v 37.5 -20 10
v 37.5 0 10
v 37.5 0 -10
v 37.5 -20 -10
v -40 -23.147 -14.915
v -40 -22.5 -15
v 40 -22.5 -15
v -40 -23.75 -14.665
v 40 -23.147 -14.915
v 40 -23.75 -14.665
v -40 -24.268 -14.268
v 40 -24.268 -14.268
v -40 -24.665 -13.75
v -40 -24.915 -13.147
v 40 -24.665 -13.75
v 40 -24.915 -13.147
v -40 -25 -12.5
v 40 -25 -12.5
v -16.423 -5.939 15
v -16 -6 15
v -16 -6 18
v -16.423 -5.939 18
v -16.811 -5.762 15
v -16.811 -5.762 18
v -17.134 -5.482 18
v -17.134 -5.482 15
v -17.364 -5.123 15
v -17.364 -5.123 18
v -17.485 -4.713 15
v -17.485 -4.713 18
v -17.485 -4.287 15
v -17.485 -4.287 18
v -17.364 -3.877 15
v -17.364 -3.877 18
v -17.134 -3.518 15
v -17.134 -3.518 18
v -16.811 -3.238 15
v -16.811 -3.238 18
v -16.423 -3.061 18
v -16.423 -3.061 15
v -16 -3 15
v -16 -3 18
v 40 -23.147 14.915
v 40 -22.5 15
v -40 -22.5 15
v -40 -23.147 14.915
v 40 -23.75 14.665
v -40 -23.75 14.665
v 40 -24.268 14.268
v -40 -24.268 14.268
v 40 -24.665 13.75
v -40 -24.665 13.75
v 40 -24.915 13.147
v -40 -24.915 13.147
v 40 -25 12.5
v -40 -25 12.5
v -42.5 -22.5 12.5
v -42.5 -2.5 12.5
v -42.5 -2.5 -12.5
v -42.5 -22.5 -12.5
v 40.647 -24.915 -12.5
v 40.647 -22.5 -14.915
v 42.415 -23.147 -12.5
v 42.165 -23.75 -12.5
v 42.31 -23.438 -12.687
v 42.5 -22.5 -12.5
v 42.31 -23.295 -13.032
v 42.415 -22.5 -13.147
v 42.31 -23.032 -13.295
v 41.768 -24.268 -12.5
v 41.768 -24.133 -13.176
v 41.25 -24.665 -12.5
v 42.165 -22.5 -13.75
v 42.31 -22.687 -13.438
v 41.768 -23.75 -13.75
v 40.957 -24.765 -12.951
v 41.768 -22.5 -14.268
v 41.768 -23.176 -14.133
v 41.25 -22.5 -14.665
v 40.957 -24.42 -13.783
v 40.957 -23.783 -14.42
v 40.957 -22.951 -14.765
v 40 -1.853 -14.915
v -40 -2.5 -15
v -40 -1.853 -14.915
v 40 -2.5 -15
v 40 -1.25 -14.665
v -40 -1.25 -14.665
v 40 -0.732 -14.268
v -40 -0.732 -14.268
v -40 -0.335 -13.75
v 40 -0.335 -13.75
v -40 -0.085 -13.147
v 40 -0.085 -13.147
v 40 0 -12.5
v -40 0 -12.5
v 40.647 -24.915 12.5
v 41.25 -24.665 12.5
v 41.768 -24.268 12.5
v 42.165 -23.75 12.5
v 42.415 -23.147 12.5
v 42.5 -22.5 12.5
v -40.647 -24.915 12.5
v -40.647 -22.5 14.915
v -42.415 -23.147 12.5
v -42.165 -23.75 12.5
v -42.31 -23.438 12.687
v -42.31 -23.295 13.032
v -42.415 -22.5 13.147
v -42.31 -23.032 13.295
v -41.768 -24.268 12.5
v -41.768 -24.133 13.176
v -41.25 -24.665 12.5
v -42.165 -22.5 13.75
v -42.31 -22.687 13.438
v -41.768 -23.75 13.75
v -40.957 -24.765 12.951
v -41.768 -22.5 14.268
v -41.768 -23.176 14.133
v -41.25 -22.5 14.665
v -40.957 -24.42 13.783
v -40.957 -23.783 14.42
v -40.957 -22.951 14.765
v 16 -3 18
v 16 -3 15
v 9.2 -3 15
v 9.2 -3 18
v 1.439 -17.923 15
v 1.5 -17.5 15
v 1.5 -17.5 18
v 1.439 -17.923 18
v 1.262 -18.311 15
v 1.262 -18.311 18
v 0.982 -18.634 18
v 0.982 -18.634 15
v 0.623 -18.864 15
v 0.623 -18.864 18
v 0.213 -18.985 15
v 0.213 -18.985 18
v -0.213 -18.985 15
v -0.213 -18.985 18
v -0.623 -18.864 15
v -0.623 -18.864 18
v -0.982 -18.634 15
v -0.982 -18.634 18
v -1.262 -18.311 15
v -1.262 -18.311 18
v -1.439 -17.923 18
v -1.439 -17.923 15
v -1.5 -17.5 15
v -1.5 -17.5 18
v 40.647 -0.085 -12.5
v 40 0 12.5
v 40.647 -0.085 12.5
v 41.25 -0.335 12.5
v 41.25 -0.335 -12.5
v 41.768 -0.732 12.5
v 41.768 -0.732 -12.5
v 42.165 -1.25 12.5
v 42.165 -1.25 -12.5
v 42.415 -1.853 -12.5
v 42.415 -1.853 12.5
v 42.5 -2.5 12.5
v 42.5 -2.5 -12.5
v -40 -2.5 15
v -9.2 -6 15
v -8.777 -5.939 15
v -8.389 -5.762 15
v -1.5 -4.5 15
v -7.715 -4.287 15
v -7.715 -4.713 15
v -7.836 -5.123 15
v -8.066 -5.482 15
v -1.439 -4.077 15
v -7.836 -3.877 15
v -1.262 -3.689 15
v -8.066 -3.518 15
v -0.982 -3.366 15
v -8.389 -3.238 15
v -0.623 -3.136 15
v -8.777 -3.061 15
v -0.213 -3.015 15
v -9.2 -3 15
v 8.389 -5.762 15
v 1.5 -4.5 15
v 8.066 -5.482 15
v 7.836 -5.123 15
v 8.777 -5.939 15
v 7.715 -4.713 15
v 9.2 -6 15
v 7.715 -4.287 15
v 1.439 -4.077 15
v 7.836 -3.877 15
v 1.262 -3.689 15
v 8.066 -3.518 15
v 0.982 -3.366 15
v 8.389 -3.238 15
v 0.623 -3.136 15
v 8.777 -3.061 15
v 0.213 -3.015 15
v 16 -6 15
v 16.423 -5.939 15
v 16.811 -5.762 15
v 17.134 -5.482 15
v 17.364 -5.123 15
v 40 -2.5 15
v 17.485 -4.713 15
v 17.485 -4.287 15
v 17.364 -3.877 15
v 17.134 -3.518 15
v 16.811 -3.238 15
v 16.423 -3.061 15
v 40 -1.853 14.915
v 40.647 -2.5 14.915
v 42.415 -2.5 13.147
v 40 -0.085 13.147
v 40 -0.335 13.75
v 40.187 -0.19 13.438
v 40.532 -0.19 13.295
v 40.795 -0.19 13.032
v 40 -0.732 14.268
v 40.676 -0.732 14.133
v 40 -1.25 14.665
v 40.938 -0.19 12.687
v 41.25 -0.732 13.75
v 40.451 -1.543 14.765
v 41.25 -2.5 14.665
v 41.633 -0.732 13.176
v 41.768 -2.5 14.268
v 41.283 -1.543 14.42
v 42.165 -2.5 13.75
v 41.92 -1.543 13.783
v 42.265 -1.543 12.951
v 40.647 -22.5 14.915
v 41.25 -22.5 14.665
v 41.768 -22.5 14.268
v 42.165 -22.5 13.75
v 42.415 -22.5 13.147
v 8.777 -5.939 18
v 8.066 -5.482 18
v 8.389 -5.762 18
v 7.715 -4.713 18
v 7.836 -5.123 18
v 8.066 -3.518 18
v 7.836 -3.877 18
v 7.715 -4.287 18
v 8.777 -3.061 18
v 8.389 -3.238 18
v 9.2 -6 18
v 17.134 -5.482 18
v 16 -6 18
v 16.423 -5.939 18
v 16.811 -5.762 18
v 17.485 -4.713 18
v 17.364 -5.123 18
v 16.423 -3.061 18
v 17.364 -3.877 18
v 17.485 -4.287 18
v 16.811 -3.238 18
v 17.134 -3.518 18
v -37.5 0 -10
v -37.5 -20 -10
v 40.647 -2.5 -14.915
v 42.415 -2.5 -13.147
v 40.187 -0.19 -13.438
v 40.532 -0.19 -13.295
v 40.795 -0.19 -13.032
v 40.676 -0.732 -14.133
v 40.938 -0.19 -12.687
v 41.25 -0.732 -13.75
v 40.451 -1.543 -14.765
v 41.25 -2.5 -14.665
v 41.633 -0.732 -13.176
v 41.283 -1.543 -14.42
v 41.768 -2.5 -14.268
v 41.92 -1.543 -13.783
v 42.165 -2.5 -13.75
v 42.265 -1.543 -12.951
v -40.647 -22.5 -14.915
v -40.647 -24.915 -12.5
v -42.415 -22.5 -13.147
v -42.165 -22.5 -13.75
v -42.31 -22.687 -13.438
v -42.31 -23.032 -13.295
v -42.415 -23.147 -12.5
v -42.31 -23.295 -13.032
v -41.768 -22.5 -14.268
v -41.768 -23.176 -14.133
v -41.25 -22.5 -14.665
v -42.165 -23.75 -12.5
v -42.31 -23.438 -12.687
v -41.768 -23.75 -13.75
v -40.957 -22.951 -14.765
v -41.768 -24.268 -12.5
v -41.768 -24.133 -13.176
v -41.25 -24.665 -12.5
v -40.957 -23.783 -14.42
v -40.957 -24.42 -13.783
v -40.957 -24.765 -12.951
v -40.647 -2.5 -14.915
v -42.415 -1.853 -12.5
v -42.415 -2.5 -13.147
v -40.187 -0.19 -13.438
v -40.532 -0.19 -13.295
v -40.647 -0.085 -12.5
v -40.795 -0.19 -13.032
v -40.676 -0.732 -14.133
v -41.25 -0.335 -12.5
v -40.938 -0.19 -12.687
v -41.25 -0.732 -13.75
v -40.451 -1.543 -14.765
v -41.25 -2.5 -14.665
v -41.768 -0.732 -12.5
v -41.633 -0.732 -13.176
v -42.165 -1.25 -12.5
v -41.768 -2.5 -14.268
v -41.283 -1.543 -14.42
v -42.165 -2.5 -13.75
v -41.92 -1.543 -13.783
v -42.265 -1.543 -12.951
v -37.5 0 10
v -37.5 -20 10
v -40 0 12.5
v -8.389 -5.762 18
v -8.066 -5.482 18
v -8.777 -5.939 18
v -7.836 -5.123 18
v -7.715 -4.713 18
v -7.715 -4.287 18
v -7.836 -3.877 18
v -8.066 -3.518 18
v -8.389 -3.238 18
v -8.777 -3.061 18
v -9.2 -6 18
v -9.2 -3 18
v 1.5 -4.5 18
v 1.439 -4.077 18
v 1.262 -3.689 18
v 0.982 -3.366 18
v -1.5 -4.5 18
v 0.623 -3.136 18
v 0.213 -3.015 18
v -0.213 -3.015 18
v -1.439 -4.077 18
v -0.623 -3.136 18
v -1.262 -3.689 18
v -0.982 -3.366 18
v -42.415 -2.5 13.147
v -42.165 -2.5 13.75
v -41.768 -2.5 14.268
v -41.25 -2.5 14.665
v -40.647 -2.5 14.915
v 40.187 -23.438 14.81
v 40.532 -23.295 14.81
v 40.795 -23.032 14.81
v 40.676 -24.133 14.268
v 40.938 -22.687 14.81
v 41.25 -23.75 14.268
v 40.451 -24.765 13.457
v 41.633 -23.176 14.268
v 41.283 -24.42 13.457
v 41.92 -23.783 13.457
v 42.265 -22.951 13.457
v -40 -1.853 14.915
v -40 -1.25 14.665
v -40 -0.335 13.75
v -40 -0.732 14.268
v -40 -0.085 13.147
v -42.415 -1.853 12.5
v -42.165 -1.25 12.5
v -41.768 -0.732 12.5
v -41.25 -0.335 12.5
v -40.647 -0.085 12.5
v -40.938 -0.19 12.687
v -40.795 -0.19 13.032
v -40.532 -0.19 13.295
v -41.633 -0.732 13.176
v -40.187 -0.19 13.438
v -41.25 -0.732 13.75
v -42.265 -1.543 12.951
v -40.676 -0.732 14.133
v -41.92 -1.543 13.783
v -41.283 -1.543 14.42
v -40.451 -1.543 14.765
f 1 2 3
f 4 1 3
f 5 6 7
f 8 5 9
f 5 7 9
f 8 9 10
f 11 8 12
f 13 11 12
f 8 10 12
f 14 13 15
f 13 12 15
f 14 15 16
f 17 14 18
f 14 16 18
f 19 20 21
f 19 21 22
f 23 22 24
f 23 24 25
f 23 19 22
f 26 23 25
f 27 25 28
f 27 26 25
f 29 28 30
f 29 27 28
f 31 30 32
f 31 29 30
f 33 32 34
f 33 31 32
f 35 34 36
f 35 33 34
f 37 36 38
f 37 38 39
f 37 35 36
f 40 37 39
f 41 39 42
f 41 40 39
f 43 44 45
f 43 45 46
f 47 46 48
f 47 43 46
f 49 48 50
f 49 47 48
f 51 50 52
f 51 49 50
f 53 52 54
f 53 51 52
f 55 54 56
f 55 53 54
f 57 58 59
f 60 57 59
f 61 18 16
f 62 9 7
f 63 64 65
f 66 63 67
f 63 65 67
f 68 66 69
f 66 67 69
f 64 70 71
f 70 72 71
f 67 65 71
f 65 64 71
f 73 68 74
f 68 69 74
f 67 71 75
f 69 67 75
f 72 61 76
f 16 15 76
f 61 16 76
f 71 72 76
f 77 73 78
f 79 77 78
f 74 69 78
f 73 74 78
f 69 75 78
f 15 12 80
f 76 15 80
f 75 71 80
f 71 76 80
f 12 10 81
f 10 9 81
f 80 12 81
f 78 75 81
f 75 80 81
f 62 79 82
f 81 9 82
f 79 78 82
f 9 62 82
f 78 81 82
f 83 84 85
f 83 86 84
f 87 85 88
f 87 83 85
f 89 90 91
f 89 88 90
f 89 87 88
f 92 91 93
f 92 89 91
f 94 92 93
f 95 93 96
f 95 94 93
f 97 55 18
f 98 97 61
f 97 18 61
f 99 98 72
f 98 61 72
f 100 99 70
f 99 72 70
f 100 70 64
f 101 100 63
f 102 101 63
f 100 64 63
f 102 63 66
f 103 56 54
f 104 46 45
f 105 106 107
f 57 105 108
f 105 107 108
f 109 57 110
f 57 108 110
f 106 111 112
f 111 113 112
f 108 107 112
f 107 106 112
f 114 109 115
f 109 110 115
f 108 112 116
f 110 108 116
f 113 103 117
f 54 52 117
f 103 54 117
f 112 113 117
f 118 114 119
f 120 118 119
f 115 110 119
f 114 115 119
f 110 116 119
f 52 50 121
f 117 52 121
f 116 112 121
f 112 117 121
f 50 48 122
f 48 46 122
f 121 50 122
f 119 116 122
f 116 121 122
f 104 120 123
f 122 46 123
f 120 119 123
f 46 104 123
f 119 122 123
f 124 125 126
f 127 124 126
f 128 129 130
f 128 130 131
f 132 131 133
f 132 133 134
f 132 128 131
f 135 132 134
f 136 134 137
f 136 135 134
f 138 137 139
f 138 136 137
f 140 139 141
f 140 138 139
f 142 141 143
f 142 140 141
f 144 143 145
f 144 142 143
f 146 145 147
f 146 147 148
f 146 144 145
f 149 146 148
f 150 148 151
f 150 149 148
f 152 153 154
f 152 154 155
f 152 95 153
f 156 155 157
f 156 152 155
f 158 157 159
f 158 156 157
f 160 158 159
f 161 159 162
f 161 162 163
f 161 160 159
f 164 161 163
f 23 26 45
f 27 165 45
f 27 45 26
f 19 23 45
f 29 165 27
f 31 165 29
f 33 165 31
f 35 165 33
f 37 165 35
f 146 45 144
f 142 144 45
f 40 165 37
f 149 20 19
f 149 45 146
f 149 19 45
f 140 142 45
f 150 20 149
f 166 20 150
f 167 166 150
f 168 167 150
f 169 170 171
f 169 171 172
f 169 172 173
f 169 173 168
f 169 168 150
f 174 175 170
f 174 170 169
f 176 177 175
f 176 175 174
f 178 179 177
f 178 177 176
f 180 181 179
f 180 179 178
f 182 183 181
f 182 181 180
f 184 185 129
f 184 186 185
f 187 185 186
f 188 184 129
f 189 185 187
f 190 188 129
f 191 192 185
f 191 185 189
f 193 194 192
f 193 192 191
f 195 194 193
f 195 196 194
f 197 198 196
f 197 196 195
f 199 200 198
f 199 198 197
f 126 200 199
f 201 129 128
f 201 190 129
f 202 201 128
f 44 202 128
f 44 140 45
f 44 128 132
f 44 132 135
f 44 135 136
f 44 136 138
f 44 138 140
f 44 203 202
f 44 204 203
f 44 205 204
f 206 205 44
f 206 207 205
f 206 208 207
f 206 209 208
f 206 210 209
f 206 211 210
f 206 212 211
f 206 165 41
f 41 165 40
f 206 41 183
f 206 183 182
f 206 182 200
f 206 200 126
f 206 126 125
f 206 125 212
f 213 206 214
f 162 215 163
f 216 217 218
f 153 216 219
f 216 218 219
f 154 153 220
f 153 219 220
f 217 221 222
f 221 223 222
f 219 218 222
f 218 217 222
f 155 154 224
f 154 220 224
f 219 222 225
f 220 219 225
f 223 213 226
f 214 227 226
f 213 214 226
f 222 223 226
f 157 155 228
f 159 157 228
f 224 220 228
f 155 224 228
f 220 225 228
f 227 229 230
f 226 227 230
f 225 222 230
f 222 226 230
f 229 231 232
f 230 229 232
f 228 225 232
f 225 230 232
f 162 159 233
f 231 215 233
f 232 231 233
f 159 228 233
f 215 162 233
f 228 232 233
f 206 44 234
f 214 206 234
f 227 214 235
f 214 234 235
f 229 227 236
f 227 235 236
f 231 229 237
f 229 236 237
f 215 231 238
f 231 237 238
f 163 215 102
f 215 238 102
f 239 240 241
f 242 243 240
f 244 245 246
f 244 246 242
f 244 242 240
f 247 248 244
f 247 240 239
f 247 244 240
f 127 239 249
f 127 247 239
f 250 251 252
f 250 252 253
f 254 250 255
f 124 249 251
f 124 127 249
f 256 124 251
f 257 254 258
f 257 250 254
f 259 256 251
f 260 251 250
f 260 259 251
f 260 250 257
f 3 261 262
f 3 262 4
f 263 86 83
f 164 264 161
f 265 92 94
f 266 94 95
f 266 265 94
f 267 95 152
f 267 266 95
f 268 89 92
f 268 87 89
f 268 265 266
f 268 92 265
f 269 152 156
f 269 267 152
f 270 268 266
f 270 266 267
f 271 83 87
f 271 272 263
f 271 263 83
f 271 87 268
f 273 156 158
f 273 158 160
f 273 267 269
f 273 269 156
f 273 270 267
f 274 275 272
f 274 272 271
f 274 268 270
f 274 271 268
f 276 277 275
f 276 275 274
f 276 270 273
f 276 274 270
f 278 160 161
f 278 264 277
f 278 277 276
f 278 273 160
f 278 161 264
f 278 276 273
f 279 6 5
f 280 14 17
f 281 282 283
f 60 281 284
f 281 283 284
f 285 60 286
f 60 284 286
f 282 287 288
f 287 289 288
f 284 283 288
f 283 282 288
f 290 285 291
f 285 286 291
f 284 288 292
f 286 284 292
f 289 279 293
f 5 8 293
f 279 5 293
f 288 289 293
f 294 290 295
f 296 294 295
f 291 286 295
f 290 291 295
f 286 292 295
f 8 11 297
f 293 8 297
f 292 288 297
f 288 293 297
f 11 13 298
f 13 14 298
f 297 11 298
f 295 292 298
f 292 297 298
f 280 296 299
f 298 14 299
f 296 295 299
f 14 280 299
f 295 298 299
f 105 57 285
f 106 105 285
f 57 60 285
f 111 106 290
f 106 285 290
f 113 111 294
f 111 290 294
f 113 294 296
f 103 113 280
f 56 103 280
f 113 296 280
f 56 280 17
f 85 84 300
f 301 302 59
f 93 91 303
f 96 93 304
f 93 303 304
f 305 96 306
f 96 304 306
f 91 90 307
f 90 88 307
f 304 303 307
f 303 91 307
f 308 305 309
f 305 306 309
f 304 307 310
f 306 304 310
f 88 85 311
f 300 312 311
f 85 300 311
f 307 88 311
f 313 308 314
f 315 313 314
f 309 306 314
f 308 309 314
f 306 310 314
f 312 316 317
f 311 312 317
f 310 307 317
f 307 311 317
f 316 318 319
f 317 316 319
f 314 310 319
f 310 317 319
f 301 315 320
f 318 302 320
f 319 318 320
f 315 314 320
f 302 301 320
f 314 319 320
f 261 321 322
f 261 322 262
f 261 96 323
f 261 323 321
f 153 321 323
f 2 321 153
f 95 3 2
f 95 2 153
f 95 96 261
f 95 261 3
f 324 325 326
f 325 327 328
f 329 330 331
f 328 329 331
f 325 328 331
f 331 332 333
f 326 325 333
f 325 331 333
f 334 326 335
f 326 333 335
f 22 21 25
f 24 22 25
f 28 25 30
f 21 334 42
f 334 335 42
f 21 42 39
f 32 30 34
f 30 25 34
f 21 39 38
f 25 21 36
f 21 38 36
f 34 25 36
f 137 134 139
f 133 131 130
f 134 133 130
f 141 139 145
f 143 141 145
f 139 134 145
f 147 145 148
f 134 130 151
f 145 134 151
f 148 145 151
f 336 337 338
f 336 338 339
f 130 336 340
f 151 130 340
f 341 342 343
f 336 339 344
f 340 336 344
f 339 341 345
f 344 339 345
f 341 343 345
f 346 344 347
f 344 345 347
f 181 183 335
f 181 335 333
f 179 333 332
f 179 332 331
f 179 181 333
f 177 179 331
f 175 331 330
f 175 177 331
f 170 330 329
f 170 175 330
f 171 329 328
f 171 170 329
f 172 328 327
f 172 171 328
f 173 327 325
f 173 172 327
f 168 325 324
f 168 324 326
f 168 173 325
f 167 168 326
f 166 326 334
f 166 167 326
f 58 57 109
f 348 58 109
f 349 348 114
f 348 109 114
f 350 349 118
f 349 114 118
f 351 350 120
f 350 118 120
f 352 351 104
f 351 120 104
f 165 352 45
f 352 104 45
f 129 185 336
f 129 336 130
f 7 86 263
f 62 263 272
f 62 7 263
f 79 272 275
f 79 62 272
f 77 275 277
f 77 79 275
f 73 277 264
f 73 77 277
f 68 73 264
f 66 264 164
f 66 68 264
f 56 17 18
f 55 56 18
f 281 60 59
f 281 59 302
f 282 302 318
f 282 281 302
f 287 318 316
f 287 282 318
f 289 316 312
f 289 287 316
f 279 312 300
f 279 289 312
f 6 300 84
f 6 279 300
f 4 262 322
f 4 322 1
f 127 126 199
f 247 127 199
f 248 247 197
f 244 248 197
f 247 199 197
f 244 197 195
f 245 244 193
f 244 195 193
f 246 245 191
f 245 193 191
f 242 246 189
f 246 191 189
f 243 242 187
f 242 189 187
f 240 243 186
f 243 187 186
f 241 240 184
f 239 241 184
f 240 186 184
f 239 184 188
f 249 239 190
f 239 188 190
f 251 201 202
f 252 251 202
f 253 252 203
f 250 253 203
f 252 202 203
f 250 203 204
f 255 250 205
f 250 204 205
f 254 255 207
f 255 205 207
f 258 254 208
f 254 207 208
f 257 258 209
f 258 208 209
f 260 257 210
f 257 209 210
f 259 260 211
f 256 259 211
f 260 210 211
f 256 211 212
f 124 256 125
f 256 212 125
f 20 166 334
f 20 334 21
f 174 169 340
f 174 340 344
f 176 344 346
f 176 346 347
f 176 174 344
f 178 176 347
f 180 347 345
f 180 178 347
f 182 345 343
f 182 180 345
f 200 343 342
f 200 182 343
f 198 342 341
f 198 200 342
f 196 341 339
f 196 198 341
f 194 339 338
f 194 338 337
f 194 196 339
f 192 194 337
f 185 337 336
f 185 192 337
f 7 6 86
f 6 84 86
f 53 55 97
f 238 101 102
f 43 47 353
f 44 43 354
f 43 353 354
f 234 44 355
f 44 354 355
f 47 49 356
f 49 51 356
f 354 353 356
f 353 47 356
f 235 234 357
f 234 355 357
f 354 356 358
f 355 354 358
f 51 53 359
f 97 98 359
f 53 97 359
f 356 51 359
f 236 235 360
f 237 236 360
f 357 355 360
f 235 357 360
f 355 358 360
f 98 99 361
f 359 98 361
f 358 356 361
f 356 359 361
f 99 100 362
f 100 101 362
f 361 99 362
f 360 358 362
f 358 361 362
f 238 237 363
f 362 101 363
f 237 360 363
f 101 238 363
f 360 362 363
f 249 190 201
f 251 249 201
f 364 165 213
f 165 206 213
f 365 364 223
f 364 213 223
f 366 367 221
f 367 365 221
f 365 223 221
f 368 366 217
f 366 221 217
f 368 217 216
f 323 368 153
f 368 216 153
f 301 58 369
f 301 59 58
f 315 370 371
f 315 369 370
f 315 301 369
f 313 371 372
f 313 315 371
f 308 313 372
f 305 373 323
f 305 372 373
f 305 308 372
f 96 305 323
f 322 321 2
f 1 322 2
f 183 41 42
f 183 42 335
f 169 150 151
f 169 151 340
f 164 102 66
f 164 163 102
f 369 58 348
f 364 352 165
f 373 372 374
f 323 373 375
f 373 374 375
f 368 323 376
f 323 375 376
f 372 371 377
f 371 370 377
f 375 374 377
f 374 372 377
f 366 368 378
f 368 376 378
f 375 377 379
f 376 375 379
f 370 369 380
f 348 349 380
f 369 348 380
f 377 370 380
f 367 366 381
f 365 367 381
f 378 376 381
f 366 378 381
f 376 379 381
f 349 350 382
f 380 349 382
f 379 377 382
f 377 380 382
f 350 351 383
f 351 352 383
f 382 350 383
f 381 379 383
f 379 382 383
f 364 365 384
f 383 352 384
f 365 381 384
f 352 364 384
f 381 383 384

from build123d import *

# Parameters (mm, degrees)
SKETCH_1_W          = 75
SKETCH_1_H          = 20
EXTRUDE_1_DEPTH     = 20
SKETCH_2_W          = 85
SKETCH_2_H          = 30
EXTRUDE_2_DEPTH     = 25
SKETCH_3_W          = 75
SKETCH_3_H          = 20
CUT_EXTRUDE_1_DEPTH = 20
EXTRUDE_3_DEPTH     = 3
FILLET_1_R          = 2.5


with BuildPart() as part:
    # Sketch 1 → Extrude 1 (new body)
    with BuildSketch(Plane(origin=(0, 0, 0), x_dir=(1, 0, 0), z_dir=(0, 1, 0))):
        Rectangle(SKETCH_1_W, SKETCH_1_H)
    extrude(amount=-EXTRUDE_1_DEPTH)

    # Sketch 2 → Extrude 2 (add)
    with BuildSketch(Plane(origin=(0, 0, 0), x_dir=(1, 0, 0), z_dir=(0, 1, 0))):
        Rectangle(SKETCH_2_W, SKETCH_2_H)
    extrude(amount=-EXTRUDE_2_DEPTH)

    # Sketch 3 → Cut-Extrude 1 (cut)
    with BuildSketch(Plane(origin=(0, 0, 0), x_dir=(1, 0, 0), z_dir=(0, 1, 0))):
        Rectangle(SKETCH_3_W, SKETCH_3_H)
    extrude(amount=-CUT_EXTRUDE_1_DEPTH, mode=Mode.SUBTRACT)

    # Sketch 5 → Extrude 3 (add)
    with BuildSketch(Plane.XY.offset(15)):
        with BuildLine():
            Line((-16, -3), (-9.2, -3))
            ThreePointArc((-9.2, -3), (-7.7, -4.5), (-9.2, -6))
            Line((-9.2, -6), (-16, -6))
            ThreePointArc((-16, -6), (-17.5, -4.5), (-16, -3))
        make_face()
        with BuildLine():
            Line((16, -3), (9.2, -3))
            ThreePointArc((9.2, -3), (7.7, -4.5), (9.2, -6))
            Line((9.2, -6), (16, -6))
            ThreePointArc((16, -6), (17.5, -4.5), (16, -3))
        make_face()
        with BuildLine():
            Line((1.5, -4.5), (1.5, -17.5))
            ThreePointArc((1.5, -17.5), (0, -19), (-1.5, -17.5))
            Line((-1.5, -17.5), (-1.5, -4.5))
            ThreePointArc((-1.5, -4.5), (0, -3), (1.5, -4.5))
        make_face()
    extrude(amount=EXTRUDE_3_DEPTH)

    # Fillet 1
    fillet_1_edges = [part.edges().sort_by_distance(p)[0] for p in [
        (0, -25, -15),
        (-42.5, -12.5, -15),
        (42.5, -25, 0),
        (42.5, -12.5, -15),
        (0, -25, 15),
        (42.5, -12.5, 15),
        (-42.5, -25, 0),
        (-42.5, -12.5, 15),
        (0, 0, -15),
        (-42.5, 0, 0),
        (0, 0, 15),
        (42.5, 0, 0),
    ]]
    fillet(fillet_1_edges, radius=FILLET_1_R)


solid = part.part
